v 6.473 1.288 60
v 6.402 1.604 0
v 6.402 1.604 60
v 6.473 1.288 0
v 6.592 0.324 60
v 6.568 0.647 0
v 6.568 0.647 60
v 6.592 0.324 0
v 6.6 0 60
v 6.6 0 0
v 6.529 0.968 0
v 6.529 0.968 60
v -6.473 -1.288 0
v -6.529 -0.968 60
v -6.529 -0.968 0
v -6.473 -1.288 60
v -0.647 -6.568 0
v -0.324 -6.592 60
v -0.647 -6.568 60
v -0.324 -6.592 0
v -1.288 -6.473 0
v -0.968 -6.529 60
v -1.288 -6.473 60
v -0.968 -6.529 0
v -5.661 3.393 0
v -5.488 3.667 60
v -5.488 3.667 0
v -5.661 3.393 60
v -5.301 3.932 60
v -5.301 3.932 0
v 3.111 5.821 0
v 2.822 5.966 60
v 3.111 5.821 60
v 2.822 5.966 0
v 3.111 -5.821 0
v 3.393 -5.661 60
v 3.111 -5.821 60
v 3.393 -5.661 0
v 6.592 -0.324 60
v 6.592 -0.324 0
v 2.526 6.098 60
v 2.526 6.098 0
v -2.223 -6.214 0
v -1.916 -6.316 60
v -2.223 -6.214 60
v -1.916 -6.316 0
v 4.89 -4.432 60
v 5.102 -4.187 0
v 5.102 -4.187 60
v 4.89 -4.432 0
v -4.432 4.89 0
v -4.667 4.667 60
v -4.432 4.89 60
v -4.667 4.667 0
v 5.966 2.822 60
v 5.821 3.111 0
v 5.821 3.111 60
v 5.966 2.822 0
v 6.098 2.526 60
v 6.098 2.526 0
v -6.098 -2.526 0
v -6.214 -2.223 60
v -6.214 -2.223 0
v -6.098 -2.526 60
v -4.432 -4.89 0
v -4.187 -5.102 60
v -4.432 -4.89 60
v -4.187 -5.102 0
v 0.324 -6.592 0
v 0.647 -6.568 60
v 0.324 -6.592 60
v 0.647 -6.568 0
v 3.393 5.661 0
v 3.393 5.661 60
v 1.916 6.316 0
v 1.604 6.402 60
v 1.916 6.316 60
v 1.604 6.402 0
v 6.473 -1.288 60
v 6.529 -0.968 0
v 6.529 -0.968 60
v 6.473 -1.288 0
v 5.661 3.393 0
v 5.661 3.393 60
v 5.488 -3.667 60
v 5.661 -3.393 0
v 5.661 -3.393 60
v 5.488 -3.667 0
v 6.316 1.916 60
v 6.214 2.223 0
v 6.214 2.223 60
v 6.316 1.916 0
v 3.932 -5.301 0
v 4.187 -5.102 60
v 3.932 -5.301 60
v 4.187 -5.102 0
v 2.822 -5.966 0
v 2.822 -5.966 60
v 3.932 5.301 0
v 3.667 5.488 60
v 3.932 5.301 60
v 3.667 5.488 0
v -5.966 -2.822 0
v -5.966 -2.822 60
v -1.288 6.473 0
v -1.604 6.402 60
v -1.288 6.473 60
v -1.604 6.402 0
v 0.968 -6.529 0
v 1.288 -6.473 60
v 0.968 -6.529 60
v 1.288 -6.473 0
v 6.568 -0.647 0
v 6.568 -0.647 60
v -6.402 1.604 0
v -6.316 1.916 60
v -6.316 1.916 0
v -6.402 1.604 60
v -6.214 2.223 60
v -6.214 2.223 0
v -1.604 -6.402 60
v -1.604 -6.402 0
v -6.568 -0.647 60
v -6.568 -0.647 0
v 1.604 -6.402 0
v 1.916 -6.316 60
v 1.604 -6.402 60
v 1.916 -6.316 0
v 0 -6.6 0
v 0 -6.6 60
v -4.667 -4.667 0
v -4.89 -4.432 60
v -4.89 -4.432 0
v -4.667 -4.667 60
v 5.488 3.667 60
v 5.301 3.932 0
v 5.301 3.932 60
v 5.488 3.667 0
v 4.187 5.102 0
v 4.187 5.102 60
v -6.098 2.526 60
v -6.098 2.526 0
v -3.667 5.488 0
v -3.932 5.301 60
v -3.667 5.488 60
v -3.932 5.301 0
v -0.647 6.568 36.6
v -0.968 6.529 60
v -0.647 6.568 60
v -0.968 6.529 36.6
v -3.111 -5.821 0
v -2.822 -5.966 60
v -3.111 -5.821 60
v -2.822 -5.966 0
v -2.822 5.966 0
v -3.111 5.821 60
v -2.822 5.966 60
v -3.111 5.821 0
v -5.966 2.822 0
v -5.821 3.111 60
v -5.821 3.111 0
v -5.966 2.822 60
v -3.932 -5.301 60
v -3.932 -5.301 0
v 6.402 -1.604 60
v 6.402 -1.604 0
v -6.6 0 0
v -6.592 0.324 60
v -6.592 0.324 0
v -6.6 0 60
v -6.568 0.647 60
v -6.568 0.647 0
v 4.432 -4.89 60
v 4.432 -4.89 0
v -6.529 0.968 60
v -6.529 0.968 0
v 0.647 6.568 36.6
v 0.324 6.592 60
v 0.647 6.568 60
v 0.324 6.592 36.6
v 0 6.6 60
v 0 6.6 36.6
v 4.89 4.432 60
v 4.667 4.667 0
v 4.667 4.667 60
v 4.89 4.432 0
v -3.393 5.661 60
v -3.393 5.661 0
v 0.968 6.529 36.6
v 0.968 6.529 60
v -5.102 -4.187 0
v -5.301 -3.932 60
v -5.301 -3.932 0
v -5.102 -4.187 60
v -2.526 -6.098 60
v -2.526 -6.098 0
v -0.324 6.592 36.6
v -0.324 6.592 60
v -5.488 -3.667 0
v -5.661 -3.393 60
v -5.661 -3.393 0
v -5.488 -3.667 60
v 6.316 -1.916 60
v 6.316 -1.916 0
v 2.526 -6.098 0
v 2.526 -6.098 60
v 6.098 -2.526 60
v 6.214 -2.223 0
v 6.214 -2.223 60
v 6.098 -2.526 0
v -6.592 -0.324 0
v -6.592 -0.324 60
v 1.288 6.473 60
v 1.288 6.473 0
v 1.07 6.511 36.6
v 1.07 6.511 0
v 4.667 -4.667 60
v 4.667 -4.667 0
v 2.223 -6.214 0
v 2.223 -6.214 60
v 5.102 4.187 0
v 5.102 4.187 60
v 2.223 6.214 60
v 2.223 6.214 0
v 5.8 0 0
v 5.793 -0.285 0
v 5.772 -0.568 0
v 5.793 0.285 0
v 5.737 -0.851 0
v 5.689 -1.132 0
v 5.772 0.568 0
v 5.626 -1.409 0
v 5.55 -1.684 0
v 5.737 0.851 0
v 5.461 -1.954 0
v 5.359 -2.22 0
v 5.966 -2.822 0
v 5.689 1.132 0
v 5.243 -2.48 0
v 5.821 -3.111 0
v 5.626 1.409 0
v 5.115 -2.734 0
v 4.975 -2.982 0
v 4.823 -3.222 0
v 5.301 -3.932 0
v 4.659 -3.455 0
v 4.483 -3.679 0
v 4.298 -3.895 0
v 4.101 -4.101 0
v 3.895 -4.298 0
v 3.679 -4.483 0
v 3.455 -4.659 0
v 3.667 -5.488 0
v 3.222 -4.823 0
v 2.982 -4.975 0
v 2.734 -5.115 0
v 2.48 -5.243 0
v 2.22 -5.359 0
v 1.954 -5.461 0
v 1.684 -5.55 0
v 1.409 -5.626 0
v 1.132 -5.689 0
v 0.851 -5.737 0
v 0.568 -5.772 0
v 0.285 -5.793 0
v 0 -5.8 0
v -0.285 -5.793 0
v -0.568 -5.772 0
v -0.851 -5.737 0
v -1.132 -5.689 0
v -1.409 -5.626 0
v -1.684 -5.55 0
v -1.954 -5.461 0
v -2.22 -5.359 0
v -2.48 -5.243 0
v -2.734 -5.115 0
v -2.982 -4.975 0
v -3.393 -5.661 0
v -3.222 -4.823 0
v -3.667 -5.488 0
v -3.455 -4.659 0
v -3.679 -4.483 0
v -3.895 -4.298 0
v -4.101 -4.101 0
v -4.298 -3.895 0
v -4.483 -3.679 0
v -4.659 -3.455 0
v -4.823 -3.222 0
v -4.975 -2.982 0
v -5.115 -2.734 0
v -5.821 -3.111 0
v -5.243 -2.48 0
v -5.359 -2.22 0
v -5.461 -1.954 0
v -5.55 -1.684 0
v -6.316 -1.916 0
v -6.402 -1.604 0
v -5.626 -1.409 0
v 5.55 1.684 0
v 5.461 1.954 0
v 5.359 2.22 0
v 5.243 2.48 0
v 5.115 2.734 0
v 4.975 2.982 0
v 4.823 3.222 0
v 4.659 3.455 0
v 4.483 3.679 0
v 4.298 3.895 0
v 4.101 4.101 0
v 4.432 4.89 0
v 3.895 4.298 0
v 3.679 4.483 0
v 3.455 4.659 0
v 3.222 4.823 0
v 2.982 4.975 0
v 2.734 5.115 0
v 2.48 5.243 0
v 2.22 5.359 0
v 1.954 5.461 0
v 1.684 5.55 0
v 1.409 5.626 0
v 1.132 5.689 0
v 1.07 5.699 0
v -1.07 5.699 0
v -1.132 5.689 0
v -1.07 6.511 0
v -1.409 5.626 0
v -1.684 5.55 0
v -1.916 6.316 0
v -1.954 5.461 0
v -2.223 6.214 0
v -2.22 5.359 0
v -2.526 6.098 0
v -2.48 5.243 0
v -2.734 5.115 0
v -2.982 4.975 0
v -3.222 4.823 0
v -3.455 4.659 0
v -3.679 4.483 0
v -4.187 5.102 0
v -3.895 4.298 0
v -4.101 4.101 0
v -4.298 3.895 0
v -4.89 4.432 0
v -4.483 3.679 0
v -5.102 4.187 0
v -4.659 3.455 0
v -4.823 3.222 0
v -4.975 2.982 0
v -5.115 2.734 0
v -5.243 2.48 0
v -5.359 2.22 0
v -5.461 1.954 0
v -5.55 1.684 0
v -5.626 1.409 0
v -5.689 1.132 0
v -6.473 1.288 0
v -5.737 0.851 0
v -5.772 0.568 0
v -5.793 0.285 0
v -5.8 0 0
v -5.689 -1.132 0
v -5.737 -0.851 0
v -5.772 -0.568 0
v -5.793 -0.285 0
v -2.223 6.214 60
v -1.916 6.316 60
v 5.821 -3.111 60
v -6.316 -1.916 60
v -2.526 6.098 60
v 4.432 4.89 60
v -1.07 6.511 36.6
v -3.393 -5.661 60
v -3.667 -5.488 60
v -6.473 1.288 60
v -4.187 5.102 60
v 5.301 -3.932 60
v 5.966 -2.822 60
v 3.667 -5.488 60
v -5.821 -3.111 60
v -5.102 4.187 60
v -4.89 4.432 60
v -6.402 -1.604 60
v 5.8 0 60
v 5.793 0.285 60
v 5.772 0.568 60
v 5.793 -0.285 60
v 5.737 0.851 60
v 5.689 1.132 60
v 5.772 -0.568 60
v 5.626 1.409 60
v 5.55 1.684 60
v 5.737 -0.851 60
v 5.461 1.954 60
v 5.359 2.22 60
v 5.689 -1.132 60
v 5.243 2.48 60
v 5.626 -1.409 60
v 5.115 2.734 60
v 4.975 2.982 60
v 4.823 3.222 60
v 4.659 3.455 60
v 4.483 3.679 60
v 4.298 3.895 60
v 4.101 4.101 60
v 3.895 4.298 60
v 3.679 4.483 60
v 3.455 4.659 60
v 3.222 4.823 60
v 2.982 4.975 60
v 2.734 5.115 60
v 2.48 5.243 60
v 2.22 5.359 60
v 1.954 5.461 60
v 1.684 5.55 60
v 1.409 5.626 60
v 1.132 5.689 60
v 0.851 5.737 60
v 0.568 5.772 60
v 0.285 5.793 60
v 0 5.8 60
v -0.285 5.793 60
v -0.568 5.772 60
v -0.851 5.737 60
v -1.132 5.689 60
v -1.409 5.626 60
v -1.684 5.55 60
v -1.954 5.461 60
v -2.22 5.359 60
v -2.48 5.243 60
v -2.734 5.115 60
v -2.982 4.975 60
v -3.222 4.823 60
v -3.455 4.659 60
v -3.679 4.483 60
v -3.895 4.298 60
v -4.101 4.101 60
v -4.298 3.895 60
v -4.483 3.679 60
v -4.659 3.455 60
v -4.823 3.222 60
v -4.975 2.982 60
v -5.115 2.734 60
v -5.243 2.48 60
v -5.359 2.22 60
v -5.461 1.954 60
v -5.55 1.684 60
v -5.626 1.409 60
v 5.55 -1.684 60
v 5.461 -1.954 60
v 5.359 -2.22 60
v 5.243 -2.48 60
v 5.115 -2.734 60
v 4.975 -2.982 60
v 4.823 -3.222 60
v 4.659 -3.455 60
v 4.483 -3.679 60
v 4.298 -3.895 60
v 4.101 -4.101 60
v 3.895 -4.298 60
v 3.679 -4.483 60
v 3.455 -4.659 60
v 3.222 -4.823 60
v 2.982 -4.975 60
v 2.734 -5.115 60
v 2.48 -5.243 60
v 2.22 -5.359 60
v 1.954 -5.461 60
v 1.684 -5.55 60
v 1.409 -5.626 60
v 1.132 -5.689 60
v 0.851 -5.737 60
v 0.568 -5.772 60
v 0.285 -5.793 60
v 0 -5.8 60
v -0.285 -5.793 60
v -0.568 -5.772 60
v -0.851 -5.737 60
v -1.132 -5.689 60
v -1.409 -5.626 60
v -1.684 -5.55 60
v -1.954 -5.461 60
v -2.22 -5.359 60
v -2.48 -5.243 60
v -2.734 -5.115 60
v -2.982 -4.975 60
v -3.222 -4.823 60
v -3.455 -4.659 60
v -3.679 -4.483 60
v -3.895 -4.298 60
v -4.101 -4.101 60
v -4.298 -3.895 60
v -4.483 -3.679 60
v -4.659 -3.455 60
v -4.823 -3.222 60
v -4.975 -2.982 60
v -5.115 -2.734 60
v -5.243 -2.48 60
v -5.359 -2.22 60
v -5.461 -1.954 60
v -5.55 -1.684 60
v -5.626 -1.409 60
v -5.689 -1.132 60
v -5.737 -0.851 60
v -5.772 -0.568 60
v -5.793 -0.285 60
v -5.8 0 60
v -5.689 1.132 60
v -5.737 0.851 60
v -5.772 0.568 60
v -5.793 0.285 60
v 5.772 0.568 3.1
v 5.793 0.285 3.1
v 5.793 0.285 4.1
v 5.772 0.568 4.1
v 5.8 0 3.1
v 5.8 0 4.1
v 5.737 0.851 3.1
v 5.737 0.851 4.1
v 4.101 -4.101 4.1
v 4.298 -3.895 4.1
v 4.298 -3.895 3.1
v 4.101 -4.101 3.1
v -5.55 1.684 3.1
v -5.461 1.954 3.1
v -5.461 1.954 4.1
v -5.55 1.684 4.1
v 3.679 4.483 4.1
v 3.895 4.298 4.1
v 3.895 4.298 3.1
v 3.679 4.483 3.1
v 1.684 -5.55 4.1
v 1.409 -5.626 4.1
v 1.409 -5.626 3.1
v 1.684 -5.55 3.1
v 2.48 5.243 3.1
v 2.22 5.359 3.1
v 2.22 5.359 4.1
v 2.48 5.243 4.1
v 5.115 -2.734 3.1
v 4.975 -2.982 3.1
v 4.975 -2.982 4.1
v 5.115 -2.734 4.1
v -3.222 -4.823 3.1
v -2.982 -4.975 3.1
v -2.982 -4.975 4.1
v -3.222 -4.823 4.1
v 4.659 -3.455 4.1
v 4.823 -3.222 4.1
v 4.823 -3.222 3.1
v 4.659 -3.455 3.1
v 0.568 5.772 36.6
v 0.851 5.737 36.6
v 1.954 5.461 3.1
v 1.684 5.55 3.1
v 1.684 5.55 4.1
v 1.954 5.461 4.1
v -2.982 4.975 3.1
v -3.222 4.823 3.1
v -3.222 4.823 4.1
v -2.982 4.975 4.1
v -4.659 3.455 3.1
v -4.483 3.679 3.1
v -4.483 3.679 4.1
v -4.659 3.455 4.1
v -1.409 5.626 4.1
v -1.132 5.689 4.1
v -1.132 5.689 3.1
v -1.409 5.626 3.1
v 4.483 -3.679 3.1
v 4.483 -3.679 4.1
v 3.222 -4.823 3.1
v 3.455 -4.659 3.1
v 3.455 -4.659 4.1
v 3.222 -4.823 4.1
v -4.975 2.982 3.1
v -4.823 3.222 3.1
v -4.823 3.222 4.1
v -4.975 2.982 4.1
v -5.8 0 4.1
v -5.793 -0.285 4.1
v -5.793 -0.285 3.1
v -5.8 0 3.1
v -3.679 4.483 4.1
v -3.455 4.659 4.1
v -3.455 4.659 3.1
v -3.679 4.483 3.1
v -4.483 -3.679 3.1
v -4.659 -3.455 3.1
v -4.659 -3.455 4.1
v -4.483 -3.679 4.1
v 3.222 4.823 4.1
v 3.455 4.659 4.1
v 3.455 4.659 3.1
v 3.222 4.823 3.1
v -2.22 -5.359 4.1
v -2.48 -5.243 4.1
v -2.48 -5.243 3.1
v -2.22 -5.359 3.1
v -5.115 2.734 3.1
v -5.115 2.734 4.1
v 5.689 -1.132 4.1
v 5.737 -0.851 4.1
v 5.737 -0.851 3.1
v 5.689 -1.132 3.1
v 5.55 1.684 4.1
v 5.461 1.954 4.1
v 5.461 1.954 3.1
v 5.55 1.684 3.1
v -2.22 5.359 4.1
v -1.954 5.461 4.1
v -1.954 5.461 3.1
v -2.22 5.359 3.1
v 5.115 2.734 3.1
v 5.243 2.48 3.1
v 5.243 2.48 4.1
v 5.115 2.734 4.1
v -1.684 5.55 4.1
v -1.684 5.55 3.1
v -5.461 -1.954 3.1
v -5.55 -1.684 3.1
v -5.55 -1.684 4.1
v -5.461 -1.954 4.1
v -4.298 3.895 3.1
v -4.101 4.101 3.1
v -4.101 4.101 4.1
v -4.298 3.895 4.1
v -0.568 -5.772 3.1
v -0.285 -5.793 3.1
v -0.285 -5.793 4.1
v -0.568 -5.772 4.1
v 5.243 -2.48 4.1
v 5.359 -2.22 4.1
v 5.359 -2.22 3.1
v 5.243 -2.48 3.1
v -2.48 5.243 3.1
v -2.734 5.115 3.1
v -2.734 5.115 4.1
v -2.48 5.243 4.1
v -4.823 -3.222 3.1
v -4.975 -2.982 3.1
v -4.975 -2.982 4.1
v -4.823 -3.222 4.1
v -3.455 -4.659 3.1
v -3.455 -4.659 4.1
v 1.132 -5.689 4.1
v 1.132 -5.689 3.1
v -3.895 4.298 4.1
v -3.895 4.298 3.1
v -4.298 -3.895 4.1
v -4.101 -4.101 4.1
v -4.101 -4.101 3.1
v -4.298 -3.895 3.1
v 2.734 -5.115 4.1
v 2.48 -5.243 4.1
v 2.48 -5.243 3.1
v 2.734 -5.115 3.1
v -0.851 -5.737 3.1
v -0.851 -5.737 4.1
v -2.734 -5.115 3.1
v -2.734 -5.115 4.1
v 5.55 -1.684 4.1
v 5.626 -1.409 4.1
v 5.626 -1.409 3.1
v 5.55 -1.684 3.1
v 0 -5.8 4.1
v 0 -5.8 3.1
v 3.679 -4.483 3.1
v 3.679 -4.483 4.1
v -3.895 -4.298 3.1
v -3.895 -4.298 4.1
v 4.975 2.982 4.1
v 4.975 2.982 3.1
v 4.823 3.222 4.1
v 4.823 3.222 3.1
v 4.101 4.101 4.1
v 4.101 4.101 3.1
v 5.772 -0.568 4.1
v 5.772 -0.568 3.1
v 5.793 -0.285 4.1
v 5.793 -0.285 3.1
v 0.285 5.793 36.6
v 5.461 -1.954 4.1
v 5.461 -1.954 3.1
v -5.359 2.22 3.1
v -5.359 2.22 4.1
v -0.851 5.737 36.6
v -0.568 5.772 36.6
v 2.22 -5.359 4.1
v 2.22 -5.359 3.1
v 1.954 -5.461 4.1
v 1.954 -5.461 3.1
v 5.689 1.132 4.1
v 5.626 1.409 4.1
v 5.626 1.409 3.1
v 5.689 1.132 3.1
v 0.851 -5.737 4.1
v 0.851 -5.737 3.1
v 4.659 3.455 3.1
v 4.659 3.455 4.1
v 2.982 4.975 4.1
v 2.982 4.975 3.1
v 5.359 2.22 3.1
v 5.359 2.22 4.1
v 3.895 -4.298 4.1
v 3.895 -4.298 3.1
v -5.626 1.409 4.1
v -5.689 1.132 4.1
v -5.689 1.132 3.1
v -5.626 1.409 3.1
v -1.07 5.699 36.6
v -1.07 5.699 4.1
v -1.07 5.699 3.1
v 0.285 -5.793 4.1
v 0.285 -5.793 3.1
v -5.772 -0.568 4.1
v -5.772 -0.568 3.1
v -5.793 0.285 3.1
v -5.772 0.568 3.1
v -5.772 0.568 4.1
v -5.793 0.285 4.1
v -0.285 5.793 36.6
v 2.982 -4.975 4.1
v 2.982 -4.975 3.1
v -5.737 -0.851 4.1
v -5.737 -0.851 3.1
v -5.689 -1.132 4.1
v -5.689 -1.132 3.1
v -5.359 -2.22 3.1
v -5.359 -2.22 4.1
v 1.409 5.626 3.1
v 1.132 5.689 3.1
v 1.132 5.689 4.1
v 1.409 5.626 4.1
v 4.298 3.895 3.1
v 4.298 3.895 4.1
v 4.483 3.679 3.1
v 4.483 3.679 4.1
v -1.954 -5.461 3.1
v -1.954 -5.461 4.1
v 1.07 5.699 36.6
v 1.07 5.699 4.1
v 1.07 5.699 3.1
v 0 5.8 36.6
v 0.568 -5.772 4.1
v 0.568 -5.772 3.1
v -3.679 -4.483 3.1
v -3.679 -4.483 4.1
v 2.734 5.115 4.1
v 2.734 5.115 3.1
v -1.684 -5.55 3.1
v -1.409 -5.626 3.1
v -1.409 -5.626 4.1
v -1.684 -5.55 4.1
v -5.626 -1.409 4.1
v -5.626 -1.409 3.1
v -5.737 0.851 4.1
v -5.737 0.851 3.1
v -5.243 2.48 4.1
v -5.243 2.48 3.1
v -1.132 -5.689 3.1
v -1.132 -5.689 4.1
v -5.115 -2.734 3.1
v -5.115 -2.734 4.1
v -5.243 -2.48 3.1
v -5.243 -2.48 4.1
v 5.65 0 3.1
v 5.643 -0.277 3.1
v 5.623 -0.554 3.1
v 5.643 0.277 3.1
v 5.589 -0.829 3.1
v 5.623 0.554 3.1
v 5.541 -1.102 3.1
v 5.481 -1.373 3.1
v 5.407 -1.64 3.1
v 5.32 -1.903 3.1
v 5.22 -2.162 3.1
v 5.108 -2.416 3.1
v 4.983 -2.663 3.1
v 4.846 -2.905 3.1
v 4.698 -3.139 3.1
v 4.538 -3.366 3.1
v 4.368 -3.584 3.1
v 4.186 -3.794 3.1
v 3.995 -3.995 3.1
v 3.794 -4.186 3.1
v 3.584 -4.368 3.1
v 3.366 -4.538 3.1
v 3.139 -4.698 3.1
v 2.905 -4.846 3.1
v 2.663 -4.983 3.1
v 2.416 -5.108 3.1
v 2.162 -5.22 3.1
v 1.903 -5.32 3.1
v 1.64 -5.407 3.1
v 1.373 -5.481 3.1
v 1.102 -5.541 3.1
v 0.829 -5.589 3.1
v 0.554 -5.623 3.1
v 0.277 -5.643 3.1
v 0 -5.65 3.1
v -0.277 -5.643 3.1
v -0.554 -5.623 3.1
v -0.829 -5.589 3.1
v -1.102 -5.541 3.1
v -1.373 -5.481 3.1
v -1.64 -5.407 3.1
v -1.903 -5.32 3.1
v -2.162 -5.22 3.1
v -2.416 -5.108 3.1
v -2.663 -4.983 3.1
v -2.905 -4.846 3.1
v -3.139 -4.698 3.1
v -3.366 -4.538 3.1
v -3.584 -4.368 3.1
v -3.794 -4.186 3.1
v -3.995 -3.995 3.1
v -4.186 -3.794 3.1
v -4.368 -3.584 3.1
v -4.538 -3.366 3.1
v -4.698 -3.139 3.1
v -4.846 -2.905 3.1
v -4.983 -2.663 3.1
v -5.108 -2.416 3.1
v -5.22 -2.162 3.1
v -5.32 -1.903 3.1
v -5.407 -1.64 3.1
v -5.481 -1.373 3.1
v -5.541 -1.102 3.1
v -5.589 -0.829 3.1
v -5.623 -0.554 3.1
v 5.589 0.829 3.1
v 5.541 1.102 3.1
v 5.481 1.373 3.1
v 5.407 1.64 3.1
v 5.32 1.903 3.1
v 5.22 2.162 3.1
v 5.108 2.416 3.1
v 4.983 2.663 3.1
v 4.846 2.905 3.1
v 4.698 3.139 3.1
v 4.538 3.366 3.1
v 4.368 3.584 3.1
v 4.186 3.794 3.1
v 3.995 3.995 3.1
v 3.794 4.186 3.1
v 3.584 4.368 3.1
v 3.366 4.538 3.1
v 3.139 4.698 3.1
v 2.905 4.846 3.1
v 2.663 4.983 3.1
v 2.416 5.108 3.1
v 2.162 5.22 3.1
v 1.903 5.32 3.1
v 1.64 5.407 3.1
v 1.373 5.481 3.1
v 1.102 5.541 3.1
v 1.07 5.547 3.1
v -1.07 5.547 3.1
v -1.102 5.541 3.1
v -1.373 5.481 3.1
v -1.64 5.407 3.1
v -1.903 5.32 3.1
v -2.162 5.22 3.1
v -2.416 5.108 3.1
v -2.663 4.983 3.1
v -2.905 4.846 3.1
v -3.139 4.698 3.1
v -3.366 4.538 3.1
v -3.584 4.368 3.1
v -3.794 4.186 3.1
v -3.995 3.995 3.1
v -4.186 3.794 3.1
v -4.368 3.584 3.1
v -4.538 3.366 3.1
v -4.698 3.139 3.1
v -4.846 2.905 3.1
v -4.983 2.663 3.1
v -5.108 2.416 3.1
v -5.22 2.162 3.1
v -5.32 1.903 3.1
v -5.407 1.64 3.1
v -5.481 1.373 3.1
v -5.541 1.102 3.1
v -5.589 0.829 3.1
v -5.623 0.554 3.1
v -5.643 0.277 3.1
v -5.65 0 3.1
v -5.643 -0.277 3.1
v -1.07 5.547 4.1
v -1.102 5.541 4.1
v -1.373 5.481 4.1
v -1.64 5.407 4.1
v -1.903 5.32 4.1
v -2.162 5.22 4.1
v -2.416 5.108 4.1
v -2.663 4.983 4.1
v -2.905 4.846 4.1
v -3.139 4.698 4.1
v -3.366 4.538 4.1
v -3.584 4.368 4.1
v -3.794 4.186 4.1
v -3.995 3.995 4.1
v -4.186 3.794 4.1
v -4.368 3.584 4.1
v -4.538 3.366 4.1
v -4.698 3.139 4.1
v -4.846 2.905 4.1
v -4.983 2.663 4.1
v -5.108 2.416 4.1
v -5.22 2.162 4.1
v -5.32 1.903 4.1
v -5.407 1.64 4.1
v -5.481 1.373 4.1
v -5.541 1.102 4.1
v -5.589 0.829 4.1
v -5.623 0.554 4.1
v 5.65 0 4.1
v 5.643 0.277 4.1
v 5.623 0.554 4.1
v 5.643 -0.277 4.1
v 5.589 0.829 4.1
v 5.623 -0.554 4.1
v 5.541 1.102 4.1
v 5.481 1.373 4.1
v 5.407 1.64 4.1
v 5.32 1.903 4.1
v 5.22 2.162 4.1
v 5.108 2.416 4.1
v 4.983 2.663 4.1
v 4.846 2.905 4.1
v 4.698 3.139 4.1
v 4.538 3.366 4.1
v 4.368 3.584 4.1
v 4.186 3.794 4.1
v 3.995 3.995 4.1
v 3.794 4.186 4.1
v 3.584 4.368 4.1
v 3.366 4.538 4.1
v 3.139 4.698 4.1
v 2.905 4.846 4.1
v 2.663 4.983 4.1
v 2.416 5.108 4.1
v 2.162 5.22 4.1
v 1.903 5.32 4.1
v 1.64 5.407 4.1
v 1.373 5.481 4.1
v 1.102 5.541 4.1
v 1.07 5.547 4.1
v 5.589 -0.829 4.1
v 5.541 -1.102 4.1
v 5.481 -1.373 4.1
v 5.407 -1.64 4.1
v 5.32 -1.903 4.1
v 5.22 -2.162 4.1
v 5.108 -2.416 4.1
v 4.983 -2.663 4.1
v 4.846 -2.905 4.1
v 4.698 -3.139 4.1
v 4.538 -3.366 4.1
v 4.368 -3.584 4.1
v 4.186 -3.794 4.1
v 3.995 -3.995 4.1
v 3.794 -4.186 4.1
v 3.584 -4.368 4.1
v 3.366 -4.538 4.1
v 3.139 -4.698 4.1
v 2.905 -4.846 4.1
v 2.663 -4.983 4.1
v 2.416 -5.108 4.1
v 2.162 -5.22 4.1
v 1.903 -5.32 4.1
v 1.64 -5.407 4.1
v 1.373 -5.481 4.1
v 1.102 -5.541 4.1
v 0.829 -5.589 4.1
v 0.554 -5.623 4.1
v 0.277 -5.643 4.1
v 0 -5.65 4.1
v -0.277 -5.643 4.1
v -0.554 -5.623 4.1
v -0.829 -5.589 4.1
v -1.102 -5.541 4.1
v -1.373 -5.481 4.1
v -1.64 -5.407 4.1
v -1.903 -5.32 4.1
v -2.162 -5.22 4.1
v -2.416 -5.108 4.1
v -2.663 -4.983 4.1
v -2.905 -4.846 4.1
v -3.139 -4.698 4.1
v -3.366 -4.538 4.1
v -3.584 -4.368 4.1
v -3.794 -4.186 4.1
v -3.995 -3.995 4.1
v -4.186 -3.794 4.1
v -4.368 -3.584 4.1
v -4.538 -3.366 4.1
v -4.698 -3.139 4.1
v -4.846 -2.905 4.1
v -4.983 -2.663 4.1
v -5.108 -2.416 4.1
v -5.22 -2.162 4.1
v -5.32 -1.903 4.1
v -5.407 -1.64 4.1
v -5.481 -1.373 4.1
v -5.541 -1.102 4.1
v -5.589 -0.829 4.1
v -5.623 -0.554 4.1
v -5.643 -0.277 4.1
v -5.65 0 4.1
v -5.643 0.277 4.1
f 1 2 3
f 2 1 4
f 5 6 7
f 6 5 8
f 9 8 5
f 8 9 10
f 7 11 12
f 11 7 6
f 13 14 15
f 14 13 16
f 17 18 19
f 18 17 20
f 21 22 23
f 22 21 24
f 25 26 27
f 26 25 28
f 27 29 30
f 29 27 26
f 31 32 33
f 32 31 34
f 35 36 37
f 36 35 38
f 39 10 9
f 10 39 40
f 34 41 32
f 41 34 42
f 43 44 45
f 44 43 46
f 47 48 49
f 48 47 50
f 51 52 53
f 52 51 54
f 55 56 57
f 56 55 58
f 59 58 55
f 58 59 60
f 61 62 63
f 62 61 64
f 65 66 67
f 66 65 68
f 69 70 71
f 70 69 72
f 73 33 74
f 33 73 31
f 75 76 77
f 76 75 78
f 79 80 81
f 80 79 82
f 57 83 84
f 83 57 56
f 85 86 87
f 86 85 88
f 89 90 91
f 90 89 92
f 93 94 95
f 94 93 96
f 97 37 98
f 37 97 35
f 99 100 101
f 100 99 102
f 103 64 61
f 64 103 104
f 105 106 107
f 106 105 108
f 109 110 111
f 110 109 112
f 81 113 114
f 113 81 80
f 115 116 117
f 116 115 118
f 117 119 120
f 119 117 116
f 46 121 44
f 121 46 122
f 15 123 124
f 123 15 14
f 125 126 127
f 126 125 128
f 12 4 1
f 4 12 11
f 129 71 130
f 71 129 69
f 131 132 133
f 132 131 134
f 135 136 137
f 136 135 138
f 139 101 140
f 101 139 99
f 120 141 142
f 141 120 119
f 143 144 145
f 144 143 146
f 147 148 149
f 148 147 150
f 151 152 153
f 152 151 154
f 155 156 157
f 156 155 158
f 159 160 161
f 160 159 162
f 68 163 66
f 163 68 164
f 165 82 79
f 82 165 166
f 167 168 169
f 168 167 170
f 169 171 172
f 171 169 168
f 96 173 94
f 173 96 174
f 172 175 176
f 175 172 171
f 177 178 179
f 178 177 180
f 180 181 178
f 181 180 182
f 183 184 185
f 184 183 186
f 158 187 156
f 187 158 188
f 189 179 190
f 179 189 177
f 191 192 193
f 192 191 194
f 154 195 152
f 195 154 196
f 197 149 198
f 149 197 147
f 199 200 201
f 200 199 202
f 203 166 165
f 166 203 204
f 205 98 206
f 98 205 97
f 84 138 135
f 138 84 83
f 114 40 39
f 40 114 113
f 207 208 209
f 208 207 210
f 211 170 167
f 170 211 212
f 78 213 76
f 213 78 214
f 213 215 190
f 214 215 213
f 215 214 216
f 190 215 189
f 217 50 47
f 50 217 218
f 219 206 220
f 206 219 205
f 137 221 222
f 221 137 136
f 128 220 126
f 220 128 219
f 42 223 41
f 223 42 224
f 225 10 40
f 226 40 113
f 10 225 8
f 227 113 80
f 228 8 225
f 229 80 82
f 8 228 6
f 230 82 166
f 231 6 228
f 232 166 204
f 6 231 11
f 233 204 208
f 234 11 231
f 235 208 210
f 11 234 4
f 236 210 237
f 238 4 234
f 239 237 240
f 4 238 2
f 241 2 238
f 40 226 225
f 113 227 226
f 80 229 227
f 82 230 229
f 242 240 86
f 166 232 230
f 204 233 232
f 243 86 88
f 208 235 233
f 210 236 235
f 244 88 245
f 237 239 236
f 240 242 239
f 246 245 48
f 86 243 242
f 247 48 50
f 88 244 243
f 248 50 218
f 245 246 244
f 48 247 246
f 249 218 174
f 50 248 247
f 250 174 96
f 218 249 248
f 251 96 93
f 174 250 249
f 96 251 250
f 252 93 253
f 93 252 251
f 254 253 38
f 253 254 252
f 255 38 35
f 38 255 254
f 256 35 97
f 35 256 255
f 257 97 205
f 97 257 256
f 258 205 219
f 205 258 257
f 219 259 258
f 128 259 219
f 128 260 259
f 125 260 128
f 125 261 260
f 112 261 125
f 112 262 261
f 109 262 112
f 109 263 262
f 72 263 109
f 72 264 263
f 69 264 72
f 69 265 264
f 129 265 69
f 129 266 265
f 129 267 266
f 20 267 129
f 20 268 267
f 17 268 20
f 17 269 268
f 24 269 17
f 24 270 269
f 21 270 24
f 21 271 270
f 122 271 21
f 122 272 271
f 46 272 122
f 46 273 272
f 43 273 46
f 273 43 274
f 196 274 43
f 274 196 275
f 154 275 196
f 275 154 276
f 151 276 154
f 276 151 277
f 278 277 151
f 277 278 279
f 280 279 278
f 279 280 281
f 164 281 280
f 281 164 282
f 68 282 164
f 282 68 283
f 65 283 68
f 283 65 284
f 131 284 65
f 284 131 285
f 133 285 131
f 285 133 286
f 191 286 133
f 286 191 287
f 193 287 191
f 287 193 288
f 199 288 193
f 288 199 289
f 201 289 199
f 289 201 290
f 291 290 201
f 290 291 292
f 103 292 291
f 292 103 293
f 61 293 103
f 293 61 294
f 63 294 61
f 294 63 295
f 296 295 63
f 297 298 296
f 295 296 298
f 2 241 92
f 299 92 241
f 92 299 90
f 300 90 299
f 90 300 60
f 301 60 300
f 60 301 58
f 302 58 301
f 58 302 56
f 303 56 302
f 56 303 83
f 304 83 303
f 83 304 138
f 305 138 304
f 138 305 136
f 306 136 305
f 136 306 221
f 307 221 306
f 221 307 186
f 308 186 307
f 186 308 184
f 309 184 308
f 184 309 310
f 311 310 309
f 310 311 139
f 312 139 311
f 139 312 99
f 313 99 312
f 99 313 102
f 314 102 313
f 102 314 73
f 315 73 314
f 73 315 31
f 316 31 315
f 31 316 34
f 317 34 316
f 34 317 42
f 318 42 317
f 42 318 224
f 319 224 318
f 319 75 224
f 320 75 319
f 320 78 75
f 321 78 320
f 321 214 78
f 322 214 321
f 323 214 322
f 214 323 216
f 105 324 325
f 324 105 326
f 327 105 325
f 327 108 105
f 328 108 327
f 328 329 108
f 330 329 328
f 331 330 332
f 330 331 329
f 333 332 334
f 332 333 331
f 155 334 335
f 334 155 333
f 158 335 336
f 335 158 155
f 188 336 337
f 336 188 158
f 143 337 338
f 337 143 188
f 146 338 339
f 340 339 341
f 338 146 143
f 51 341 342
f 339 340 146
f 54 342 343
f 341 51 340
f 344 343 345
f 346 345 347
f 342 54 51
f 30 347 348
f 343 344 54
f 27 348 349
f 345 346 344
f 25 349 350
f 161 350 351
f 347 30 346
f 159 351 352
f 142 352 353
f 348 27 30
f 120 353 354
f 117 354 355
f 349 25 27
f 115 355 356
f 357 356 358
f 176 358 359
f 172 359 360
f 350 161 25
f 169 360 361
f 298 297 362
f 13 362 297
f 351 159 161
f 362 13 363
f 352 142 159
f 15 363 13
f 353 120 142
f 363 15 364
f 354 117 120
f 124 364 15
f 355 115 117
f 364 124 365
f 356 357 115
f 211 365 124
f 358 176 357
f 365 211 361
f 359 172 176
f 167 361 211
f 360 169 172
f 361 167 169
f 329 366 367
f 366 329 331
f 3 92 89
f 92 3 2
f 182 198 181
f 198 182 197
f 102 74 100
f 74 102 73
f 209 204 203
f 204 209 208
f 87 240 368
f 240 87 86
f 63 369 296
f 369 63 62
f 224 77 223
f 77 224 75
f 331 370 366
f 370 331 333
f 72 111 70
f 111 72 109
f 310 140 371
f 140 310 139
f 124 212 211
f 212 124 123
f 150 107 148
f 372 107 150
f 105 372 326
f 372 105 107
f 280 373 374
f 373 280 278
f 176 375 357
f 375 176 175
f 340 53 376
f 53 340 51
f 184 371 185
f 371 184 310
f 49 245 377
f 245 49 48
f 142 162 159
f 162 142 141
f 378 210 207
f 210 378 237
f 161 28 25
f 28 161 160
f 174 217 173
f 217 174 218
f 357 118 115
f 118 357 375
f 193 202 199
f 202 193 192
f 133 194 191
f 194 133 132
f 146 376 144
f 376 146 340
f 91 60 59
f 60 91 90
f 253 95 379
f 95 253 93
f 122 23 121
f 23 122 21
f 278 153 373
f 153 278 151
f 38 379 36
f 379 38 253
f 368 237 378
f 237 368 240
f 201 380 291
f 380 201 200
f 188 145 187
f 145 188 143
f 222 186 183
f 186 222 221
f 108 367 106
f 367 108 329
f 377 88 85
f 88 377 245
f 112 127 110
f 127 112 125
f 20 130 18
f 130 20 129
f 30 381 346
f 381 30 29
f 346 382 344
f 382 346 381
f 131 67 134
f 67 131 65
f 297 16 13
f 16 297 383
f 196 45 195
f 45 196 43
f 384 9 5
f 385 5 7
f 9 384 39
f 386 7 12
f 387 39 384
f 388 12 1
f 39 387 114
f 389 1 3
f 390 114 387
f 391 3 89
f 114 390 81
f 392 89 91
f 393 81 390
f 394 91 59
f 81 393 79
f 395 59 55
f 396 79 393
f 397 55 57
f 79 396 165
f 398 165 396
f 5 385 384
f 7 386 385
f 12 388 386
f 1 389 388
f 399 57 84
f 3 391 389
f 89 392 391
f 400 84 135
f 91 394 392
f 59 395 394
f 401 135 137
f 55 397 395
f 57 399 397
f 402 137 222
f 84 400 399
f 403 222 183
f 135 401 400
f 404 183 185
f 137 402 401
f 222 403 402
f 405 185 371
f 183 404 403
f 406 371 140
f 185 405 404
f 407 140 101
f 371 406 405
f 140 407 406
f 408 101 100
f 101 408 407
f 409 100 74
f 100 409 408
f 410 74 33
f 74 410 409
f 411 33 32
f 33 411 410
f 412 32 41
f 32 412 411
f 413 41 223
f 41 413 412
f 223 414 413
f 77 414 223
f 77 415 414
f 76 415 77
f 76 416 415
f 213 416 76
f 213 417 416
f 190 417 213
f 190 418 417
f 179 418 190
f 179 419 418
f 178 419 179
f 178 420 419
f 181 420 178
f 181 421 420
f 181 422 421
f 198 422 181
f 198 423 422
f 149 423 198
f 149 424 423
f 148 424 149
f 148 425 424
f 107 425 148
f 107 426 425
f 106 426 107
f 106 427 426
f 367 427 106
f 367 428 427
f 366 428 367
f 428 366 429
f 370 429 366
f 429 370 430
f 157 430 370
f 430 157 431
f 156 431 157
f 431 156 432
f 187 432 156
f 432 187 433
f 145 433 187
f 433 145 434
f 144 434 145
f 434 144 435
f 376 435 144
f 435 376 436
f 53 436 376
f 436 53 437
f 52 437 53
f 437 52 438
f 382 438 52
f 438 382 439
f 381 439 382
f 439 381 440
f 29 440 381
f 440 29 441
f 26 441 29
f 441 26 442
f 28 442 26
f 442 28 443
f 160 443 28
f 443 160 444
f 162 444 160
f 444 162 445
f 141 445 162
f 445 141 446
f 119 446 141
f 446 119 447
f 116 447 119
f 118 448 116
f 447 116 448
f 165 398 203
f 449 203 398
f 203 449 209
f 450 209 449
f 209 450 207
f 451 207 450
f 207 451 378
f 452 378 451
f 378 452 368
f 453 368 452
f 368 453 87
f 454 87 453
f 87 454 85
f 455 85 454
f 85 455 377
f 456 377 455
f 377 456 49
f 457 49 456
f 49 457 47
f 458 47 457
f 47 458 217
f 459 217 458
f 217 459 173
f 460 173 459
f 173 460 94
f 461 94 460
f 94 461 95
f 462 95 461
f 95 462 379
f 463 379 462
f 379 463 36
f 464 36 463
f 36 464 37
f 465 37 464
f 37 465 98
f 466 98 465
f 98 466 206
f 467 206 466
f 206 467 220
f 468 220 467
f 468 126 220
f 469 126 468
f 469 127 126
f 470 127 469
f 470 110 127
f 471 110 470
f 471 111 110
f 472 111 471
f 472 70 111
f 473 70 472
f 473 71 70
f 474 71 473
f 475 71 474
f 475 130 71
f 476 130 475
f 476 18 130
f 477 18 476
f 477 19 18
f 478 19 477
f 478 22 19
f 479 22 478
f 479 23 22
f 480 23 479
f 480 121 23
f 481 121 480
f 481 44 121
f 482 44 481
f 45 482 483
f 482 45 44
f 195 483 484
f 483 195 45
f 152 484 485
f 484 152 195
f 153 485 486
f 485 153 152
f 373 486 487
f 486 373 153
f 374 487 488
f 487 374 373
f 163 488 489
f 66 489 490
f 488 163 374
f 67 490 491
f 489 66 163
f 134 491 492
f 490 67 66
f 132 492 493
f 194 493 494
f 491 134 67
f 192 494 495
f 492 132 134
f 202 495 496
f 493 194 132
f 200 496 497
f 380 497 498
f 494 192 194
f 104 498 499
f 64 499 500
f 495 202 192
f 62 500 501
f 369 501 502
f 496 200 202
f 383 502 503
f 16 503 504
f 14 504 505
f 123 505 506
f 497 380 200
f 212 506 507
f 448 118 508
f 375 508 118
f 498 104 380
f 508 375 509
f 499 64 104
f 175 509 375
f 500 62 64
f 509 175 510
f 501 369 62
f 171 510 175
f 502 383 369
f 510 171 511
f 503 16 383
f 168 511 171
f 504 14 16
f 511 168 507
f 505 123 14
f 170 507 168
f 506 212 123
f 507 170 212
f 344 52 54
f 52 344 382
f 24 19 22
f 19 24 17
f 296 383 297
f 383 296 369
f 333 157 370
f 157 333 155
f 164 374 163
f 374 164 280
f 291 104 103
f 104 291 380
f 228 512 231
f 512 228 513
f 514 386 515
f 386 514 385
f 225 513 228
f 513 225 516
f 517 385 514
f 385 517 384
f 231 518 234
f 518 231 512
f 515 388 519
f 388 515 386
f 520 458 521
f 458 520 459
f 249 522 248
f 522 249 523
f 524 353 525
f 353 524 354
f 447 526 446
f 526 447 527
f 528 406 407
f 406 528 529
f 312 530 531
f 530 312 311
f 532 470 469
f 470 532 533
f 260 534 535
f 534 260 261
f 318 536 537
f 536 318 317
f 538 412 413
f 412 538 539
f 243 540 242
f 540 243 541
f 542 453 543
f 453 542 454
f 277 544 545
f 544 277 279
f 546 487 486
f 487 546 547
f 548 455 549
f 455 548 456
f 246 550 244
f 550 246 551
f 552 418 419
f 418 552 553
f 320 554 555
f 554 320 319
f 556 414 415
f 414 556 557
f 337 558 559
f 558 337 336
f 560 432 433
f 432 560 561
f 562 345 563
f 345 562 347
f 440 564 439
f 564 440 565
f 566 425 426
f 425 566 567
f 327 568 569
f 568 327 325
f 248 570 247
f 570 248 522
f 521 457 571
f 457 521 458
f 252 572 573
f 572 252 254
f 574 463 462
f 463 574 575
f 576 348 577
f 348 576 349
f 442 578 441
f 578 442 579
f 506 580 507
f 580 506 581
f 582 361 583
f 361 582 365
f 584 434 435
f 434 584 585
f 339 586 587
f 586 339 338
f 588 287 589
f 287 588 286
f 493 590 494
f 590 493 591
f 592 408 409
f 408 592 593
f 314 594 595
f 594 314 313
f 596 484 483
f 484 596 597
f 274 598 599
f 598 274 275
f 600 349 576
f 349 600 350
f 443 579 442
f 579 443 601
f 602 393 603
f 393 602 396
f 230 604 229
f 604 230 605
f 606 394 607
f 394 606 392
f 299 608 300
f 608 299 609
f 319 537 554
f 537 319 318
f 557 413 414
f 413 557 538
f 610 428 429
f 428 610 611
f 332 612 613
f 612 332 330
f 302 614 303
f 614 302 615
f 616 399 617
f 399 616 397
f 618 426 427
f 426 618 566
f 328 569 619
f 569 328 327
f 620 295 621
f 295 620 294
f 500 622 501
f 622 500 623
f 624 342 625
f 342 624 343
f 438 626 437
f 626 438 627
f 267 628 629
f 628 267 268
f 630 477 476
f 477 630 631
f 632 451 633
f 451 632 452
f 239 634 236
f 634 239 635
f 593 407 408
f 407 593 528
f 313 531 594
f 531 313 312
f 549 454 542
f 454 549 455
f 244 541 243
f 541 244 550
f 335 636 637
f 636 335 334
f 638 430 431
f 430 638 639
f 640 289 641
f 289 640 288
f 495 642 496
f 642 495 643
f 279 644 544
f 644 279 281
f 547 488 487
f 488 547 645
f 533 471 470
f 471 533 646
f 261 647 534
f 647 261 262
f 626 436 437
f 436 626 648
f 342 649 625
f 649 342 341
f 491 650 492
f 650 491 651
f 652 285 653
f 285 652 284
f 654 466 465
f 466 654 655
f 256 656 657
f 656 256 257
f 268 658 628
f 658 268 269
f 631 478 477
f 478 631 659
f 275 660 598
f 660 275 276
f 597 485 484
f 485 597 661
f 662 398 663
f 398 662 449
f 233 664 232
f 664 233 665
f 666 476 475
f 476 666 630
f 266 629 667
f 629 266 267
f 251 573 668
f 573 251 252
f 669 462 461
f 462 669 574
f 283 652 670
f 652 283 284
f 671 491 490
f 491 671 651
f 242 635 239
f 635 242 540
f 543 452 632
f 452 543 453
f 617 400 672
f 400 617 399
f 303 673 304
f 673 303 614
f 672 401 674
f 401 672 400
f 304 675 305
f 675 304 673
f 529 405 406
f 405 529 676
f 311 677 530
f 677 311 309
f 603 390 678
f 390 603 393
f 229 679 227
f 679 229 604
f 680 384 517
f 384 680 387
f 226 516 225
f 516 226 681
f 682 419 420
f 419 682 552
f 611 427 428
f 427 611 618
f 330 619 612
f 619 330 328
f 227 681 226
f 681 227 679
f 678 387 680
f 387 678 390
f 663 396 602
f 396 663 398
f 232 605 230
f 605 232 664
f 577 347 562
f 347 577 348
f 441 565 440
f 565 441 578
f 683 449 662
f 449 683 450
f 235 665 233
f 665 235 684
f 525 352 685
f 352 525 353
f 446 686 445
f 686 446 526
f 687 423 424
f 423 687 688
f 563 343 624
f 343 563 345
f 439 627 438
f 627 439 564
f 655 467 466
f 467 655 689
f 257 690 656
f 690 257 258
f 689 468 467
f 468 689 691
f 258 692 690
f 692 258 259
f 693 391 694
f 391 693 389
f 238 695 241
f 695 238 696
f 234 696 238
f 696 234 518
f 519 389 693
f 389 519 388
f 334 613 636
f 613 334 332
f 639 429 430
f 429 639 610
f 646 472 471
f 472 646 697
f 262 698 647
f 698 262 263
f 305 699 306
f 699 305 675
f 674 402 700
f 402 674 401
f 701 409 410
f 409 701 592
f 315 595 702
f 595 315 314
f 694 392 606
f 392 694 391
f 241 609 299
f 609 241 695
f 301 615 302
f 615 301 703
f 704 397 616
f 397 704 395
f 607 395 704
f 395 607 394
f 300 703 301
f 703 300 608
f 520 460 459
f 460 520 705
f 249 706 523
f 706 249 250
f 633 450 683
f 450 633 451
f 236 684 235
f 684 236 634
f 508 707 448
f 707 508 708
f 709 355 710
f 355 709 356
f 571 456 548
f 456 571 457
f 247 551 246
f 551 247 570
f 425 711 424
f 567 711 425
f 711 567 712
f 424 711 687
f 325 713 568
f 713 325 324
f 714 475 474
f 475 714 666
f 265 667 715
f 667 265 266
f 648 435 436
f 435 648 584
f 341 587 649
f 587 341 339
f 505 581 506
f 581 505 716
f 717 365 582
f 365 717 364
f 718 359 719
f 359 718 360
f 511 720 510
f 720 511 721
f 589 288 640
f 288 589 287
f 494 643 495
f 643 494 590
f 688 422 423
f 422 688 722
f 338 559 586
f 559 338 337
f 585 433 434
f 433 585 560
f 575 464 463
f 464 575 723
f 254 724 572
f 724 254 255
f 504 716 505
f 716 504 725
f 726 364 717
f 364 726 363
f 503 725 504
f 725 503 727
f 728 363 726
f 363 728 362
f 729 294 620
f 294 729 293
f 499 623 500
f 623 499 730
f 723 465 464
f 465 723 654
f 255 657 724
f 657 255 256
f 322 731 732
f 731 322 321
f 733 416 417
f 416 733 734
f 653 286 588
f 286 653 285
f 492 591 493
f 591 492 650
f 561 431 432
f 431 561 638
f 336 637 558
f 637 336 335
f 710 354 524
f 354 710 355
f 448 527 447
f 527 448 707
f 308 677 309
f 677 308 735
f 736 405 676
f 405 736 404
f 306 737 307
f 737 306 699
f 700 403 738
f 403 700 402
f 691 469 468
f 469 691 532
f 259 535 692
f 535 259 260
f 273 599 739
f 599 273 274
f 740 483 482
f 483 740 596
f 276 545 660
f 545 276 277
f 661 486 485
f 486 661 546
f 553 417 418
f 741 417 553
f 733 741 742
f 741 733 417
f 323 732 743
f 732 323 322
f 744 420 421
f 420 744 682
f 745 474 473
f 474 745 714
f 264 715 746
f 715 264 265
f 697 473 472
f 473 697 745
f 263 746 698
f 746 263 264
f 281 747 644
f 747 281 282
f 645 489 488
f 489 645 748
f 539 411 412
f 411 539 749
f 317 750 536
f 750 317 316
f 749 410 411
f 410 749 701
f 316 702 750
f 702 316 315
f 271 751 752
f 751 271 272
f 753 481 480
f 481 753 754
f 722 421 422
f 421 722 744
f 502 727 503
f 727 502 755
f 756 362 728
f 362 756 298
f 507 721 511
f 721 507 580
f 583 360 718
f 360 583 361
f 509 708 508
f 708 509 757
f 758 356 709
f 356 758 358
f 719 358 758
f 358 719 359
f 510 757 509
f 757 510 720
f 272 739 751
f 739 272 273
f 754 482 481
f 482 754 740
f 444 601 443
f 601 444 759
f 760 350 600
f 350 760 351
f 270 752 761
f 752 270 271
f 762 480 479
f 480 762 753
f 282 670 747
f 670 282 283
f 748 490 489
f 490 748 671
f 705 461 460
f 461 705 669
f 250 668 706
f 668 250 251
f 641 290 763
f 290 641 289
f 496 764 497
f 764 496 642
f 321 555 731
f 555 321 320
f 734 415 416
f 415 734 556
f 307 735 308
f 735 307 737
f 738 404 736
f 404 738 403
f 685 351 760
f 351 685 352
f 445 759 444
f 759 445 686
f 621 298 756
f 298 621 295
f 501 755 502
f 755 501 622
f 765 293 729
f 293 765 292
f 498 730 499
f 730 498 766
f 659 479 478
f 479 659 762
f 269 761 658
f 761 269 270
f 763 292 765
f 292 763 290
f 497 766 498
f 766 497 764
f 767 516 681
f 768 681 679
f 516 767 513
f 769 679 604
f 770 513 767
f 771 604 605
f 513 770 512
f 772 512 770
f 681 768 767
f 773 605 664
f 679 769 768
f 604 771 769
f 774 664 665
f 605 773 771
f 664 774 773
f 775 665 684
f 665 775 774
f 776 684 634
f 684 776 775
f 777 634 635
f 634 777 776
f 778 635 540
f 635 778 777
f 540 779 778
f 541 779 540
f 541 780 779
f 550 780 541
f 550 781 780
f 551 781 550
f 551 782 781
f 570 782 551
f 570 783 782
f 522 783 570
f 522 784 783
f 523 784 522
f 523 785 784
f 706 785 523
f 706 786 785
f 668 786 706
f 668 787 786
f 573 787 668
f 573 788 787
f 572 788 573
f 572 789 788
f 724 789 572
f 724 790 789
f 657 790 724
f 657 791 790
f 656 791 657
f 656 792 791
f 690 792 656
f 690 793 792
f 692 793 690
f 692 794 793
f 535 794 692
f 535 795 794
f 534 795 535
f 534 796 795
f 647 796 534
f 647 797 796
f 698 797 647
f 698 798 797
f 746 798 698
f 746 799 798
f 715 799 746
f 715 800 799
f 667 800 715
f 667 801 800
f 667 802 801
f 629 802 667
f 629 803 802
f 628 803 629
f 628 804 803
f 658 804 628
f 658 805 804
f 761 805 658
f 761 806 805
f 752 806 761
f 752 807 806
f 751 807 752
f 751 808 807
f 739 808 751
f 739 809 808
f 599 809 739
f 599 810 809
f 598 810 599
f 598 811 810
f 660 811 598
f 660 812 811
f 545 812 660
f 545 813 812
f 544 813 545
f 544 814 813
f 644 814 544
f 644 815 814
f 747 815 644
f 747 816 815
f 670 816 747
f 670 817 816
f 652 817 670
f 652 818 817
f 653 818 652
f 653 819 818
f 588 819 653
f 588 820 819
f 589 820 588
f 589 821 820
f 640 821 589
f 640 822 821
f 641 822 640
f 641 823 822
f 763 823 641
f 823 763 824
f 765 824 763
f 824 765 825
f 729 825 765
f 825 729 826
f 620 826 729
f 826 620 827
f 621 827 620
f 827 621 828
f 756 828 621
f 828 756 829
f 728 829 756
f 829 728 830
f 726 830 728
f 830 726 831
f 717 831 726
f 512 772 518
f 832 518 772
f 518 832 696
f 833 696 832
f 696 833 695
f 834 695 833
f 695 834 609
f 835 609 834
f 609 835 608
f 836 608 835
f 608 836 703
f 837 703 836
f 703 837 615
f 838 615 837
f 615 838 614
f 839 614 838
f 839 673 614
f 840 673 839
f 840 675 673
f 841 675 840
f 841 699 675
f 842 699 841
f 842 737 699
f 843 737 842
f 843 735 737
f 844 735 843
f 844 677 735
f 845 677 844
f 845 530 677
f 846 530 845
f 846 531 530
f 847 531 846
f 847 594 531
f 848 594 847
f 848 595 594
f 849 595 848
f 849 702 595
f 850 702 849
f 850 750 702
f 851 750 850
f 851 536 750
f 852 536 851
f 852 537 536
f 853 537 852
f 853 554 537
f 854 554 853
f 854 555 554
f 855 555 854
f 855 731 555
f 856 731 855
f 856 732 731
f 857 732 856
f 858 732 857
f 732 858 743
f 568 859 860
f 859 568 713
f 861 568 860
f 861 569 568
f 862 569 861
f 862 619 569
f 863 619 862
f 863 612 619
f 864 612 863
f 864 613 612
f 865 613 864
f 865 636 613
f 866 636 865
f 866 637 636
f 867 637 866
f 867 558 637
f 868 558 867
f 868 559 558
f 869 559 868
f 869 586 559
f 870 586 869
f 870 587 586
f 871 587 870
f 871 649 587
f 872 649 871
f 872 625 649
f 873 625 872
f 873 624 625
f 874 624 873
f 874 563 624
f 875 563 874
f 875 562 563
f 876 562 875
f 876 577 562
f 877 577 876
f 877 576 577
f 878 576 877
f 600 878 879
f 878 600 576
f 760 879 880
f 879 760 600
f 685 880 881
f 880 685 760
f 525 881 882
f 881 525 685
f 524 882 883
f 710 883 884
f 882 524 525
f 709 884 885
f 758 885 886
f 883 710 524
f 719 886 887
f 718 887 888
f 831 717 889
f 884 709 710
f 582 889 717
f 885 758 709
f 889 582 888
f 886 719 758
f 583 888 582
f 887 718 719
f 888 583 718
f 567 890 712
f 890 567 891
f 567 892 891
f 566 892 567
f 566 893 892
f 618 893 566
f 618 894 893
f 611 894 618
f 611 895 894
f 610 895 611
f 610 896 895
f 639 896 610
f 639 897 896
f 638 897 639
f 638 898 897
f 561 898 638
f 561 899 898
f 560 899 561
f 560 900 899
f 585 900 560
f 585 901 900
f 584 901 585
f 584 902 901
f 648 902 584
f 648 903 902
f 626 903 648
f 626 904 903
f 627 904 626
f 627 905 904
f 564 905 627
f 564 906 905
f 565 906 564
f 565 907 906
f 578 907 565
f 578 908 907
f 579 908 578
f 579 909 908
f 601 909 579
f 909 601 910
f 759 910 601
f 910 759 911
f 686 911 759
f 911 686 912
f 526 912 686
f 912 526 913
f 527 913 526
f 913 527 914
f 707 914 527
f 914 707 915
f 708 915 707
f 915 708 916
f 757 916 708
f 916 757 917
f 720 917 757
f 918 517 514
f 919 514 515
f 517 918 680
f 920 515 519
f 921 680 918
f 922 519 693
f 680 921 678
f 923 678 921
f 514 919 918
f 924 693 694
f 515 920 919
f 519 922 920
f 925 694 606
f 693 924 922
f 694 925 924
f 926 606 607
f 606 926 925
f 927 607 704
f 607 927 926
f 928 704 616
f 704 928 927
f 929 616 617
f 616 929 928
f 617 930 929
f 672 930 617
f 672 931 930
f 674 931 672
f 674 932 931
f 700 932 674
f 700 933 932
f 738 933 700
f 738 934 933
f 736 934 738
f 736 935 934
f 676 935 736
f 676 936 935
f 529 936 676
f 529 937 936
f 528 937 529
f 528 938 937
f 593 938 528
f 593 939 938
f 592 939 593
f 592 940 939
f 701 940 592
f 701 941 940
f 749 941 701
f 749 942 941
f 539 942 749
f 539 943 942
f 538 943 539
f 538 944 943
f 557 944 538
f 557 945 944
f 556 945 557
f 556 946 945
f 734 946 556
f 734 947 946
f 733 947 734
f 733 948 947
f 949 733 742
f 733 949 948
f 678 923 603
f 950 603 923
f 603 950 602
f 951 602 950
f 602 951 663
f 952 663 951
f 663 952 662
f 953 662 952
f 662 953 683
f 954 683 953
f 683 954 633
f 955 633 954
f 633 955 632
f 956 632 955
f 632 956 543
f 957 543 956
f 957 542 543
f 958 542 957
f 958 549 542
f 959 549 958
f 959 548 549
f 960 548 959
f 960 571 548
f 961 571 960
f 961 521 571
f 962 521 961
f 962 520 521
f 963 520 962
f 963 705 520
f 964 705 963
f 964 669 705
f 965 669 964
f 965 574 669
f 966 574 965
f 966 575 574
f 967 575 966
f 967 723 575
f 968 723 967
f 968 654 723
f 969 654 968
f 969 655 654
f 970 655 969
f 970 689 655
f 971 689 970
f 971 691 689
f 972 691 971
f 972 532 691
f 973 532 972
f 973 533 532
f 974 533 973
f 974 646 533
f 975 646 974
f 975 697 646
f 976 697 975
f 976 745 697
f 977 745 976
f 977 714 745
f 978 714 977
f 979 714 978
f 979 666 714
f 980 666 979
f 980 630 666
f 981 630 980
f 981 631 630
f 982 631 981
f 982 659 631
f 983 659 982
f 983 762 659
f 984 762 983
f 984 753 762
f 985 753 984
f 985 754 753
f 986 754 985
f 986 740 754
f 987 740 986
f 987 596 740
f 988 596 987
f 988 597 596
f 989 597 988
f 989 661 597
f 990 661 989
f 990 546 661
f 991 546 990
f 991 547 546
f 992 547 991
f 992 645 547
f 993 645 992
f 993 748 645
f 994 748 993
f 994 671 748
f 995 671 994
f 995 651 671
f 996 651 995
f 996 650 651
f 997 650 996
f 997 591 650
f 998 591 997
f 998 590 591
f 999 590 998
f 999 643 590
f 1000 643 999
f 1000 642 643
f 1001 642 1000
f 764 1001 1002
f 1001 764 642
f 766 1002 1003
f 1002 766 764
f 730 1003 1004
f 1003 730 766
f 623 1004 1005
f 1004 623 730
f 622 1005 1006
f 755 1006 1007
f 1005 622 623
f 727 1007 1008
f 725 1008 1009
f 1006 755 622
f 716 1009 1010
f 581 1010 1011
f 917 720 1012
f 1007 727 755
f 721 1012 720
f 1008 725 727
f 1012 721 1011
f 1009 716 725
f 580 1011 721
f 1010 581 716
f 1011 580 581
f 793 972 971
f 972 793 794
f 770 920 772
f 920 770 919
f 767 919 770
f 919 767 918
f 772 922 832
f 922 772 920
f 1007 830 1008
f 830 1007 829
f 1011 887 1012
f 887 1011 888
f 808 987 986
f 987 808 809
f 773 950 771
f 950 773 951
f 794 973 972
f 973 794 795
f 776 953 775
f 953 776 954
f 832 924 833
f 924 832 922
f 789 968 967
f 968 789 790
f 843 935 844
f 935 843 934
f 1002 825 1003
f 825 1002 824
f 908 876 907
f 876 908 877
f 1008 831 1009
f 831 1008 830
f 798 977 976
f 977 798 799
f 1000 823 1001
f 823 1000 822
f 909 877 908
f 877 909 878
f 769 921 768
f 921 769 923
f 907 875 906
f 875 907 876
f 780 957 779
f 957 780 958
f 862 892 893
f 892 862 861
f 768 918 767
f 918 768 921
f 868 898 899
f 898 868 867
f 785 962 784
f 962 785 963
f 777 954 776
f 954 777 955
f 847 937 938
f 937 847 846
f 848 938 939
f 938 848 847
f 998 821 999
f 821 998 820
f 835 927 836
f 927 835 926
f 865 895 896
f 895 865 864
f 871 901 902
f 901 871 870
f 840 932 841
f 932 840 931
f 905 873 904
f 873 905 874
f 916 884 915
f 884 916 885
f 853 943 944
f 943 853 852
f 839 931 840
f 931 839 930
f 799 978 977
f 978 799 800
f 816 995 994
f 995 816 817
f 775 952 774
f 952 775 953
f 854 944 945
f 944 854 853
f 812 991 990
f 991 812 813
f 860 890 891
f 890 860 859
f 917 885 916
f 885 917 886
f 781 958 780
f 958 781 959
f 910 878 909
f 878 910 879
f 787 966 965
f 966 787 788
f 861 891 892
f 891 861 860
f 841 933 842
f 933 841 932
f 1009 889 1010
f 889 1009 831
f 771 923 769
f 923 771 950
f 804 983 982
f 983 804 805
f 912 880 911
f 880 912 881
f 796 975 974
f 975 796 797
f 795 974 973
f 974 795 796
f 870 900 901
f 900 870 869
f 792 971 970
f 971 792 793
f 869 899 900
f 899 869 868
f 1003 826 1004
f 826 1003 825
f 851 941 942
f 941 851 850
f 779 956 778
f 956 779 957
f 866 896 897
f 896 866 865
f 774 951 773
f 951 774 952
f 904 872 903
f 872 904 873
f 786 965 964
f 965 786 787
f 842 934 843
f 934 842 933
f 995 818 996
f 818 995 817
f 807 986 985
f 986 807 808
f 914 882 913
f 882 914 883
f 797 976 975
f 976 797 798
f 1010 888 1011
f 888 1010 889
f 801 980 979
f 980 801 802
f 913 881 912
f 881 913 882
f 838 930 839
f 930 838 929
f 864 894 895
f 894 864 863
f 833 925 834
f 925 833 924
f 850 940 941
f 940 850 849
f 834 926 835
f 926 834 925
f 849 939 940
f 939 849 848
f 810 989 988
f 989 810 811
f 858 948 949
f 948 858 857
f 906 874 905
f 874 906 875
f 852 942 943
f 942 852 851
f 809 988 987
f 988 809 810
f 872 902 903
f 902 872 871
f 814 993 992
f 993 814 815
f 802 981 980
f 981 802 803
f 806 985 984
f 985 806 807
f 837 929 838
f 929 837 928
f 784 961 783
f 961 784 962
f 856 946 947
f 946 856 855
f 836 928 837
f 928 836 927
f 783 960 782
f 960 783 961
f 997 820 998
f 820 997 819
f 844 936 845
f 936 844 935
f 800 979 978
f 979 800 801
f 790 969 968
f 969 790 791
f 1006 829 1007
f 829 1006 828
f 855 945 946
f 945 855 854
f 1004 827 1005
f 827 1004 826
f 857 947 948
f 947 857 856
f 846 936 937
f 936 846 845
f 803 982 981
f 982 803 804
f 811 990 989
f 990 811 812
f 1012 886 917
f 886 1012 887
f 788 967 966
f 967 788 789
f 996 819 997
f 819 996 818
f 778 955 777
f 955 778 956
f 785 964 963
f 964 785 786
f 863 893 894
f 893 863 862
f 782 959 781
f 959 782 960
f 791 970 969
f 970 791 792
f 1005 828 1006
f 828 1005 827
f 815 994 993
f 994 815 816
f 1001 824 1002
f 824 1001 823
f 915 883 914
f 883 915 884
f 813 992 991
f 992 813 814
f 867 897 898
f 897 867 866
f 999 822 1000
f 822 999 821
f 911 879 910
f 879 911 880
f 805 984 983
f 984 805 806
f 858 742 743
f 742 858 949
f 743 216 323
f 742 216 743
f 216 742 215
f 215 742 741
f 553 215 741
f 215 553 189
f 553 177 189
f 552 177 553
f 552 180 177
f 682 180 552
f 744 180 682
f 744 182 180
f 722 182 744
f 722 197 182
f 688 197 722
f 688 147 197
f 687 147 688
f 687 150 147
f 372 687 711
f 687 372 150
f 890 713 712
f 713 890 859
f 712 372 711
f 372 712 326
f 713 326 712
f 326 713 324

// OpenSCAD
// file: consts.scad
STRIPE_X = 3.4; //width of the LED stripe pcb
STRIPE_Y = 48.5; //length of LED stripe pcb
STRIPE_Z = 0.6; //pcb thickness of LED stripe pcb
LED_X=2; //edge length of LED (assumed to be square)
LED_Z = 1; //LED height above PCB

FIL_D = 0.25; //fiber diameter
NOZ_D = 0.4; //nozzle diameter
CLIP_Z = 5; //height of clip
N = 64; //number of fibers

D_I = 11.6; //inner diameter of pen
D_O = D_I+4*NOZ_D; //outer diameter of pen

CLIP_X = 2*FIL_D+4*NOZ_D;
CLIP_L = 2*N*FIL_D+4*NOZ_D;

CAP_H = 3; //height of cap cylinder attached to clip

PEN_UPPER_Z = 60; //height of upper pen part 
PEN_LOWER_BODY_Z = 60; //height of the cylindrical part
PEN_LOWER_TIP_Z = 20; //height of the tip cone

FIBER_CLAMP_Z = 2;
FIBER_CLAMP_X = 1.2;

STRIPE_JOINER_Z = 3; //height of the 4stripe joiner
// main file
$fn=128;

include <consts.scad>



module penshaft() {
    difference() {
    cylinder(h=PEN_UPPER_Z, d=D_O);
    cylinder(h=PEN_UPPER_Z, d=D_I);
    }
}


module penclip() {
translate([0, 5, (CLIP_L+CAP_H)/2])cube([CLIP_X+0.04, 10, CLIP_L+CAP_H], center=true);
}

module clip_retainer() {
translate([0,0,CAP_H+0.1])
difference() {
    cylinder(h=1, d=D_I);
    cylinder(h=1, d=D_I-0.3);
}
}


difference() {
union() {
    penshaft();
    clip_retainer();
}
penclip();
}
